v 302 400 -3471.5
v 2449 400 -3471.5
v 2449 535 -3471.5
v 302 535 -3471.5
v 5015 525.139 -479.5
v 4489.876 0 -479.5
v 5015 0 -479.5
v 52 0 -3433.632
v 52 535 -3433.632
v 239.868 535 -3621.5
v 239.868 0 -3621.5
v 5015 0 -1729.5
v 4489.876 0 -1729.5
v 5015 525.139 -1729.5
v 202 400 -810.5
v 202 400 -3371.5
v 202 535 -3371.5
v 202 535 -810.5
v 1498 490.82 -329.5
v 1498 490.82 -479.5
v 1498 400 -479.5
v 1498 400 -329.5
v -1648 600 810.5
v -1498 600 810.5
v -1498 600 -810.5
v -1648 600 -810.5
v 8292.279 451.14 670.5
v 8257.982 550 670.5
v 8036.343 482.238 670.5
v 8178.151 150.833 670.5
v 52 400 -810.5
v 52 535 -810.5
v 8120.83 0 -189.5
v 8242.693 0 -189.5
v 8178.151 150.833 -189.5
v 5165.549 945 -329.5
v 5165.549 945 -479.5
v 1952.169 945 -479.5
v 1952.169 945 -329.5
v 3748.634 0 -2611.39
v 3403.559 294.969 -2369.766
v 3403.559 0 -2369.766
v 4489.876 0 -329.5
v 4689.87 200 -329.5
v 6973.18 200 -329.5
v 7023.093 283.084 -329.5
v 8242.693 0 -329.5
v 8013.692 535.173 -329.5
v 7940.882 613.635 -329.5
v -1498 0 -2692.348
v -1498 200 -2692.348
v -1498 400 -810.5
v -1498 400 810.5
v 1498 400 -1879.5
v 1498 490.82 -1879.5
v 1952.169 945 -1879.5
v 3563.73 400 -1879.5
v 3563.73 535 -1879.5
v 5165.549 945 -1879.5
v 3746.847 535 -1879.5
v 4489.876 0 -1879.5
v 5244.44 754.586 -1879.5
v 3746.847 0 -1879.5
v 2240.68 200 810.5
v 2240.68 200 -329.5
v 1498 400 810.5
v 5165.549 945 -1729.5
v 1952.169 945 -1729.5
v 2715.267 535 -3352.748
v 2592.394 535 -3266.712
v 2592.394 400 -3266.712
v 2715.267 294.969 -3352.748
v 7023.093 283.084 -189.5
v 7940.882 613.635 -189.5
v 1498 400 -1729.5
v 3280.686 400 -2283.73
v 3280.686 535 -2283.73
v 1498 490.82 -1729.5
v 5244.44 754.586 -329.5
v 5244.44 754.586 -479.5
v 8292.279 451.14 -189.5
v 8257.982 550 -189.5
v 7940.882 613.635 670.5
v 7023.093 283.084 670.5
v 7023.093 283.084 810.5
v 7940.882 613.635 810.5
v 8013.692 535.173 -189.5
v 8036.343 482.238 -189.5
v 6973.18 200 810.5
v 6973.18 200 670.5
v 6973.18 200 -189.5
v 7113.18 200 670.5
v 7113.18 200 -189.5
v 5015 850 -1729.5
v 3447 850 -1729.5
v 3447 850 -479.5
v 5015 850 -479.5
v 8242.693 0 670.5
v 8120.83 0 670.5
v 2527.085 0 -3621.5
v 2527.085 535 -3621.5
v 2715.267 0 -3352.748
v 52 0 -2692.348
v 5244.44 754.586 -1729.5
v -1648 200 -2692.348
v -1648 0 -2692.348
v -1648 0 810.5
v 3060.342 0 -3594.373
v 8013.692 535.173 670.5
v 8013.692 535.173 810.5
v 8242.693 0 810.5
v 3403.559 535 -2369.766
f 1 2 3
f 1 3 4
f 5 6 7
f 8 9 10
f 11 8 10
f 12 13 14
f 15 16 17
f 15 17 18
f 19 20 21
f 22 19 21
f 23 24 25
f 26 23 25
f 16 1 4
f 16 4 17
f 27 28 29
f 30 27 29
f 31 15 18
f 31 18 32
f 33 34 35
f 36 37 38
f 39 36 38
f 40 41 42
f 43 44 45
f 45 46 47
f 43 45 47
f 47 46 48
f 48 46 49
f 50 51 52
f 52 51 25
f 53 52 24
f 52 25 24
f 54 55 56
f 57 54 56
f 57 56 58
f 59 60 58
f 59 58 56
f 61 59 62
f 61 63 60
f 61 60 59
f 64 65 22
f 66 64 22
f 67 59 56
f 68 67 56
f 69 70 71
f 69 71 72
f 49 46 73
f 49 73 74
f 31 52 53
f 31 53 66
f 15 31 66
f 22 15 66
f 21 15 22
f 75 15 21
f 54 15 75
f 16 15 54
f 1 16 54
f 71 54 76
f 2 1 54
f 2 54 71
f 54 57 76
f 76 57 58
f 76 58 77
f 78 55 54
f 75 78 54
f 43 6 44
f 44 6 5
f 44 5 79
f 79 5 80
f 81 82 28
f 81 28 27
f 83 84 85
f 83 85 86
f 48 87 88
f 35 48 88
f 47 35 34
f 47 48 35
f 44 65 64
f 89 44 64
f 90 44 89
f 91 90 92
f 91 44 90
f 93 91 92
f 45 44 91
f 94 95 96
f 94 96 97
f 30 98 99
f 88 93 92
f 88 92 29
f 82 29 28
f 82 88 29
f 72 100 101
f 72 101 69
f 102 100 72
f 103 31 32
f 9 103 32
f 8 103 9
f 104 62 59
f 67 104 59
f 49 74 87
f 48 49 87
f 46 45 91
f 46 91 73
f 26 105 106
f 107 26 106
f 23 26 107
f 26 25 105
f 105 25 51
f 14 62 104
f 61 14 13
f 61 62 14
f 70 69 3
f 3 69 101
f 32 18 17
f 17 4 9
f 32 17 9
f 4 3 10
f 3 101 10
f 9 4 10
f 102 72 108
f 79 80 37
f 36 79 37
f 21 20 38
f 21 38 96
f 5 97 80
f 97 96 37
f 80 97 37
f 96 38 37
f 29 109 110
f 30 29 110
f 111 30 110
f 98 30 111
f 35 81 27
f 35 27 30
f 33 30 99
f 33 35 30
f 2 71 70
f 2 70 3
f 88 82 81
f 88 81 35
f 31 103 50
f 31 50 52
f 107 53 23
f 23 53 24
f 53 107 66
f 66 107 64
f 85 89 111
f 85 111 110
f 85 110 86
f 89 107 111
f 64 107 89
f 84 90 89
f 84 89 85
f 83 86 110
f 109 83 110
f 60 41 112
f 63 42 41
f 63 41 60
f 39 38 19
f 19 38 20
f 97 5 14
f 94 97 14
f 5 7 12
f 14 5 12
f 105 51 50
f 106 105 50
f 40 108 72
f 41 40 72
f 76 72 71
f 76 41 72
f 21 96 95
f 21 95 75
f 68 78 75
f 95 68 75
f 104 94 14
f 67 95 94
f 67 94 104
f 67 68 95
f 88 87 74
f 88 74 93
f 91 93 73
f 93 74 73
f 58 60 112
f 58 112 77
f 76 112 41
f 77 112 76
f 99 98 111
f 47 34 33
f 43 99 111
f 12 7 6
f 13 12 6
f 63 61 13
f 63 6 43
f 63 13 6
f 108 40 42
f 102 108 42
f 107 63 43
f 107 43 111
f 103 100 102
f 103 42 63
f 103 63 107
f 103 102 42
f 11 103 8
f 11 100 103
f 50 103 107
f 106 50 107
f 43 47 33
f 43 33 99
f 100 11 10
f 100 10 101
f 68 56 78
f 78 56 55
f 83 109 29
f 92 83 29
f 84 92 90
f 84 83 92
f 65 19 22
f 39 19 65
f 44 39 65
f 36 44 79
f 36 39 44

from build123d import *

# Parameters (mm, degrees)
EXTRUDE_2_DEPTH      = 400
EXTRUDE_21_DEPTH     = 1700
SKETCH_8_W           = 3517
SKETCH_8_H           = 1550
EXTRUDE_3_DEPTH      = 850
CUT_EXTRUDE_1_DEPTH  = 5979.702952982
SKETCH_10_W          = 5615.18
SKETCH_10_H          = 1140
EXTRUDE_4_DEPTH      = 200
EXTRUDE_5_DEPTH      = 1140
EXTRUDE_6_DEPTH      = 140
EXTRUDE_10_DEPTH     = 150
EXTRUDE_11_DEPTH     = 535
CUT_EXTRUDE_START    = -1550
CUT_EXTRUDE_8_DEPTH  = 150
EXTRUDE_12_DEPTH     = 150
EXTRUDE_START        = -1400
EXTRUDE_13_DEPTH     = 150
CUT_EXTRUDE_9_DEPTH  = 150
CUT_EXTRUDE_10_DEPTH = 150
CUT_EXTRUDE_11_DEPTH = 9020.061936414
EXTRUDE_14_DEPTH     = 1200
EXTRUDE_18_DEPTH     = 860
EXTRUDE_START_2      = -1000
EXTRUDE_20_DEPTH     = 140


with BuildPart() as part:
    # 草图1 → 凸台-拉伸2 (new body)
    with BuildSketch(Plane(origin=(0, 0, 0), x_dir=(1, 0, 0), z_dir=(0, 1, 0))):
        Polygon((-1498, -810.5), (1498, -810.5), (1498, 1879.5), (3563.73040083, 1879.5), (2449, 3471.5), (202, 3471.5), (202, 810.5), (-1498, 810.5), align=None)
    extrude(amount=EXTRUDE_2_DEPTH)

    # 草图2 → 凸台-拉伸21 (add)
    with BuildSketch(Plane.ZY.offset(-202)):
        Polygon((-810.5, 0), (-2692.348222387, 0), (-810.5, 400), align=None)
    extrude(amount=EXTRUDE_21_DEPTH)

    # 草图8 → 凸台-拉伸3 (add)
    with BuildSketch(Plane(origin=(0, 0, 0), x_dir=(1, 0, 0), z_dir=(0, 1, 0))):
        with Locations((3256.5, 1104.5)):
            Rectangle(SKETCH_8_W, SKETCH_8_H)
    extrude(amount=EXTRUDE_3_DEPTH)

    # 草图9 → 切除-拉伸1 (cut, through all)
    with BuildSketch(Plane.XY.offset(-329.5)):
        Polygon((3447, 850), (1498, 400), (1498, 850), align=None)
    extrude(amount=-CUT_EXTRUDE_1_DEPTH, mode=Mode.SUBTRACT)

    # 草图10 → 凸台-拉伸4 (add)
    with BuildSketch(Plane(origin=(0, 0, 0), x_dir=(1, 0, 0), z_dir=(0, 1, 0))):
        with Locations((4305.59, -240.5)):
            Rectangle(SKETCH_10_W, SKETCH_10_H)
    extrude(amount=EXTRUDE_4_DEPTH)

    # 草图11 → 凸台-拉伸5 (add)
    with BuildSketch(Plane.XY.offset(-329.5)):
        Polygon((1498, 400), (1498, 200), (2240.68, 200), align=None)
    extrude(amount=EXTRUDE_5_DEPTH)

    # 草图13<4> → 凸台-拉伸6 (add)
    with BuildSketch(Plane(origin=(0, 0, -329.5), x_dir=(-1, 0, 0), z_dir=(0, 0, -1))):
        Polygon((-6853.029478436, 0), (-7023.093186264, 283.084427124), (-7940.882052173, 613.635251678), (-8013.69202852, 535.173356822), (-8242.693186264, 0), align=None)
    extrude(amount=-EXTRUDE_6_DEPTH)

    # 草图16 → 凸台-拉伸10 (add)
    with BuildSketch(Plane.ZY.offset(1498)):
        Polygon((-810.5, 600), (-2692.348222387, 200), (-2692.348222387, 0), (810.5, 0), (810.5, 600), align=None)
    extrude(amount=EXTRUDE_10_DEPTH)

    # 草图17 → 凸台-拉伸11 (add)
    with BuildSketch(Plane(origin=(0, 0, 0), x_dir=(1, 0, 0), z_dir=(0, 1, 0))):
        Polygon((202, 810.5), (52, 810.5), (52, 3433.632034356), (239.867965644, 3621.5), (2527.085057583, 3621.5), (3746.846589144, 1879.5), (3563.73040083, 1879.5), (2449, 3471.5), (302, 3471.5), (202, 3371.5), align=None)
    extrude(amount=EXTRUDE_11_DEPTH)

    # 草图18<2> → 切除-拉伸8 (cut)
    with BuildSketch(Plane(origin=(0, 0, -1879.5), x_dir=(-1, 0, 0), z_dir=(0, 0, -1)).offset(CUT_EXTRUDE_START)):
        Polygon((-4489.875994157, 0), (-5244.44, 754.585712816), (-5165.54937105, 945), (-1952.16937105, 945), (-1498, 490.82), (-1498, 0), align=None)
    extrude(amount=CUT_EXTRUDE_8_DEPTH, mode=Mode.SUBTRACT)

    # 草图18<3> → 凸台-拉伸12 (add)
    with BuildSketch(Plane(origin=(0, 0, -1879.5), x_dir=(-1, 0, 0), z_dir=(0, 0, -1))):
        Polygon((-4489.875994157, 0), (-5244.44, 754.585712816), (-5165.54937105, 945), (-1952.16937105, 945), (-1498, 490.82), (-1498, 0), align=None)
    extrude(amount=-EXTRUDE_12_DEPTH)

    # 草图18 → 凸台-拉伸13 (add)
    with BuildSketch(Plane(origin=(0, 0, -1879.5), x_dir=(-1, 0, 0), z_dir=(0, 0, -1)).offset(EXTRUDE_START)):
        Polygon((-4489.875994157, 0), (-5244.44, 754.585712816), (-5165.54937105, 945), (-1952.16937105, 945), (-1498, 490.82), (-1498, 0), align=None)
    extrude(amount=-EXTRUDE_13_DEPTH)

    # 草图19 → 切除-拉伸9 (cut)
    with BuildSketch(Plane(origin=(0, 0, -1879.5), x_dir=(-1, 0, 0), z_dir=(0, 0, -1))):
        Polygon((-5015, 525.139112385), (-4489.875994157, 0), (-5015, 0), align=None)
    extrude(amount=-CUT_EXTRUDE_9_DEPTH, mode=Mode.SUBTRACT)

    # 草图19<2> → 切除-拉伸10 (cut)
    with BuildSketch(Plane(origin=(0, 0, -1879.5), x_dir=(-1, 0, 0), z_dir=(0, 0, -1)).offset(CUT_EXTRUDE_START)):
        Polygon((-5015, 525.139112385), (-4489.875994157, 0), (-5015, 0), align=None)
    extrude(amount=CUT_EXTRUDE_10_DEPTH, mode=Mode.SUBTRACT)

    # 草图20 → 切除-拉伸11 (cut, through all)
    with BuildSketch(Plane(origin=(0, 535, 0), x_dir=(1, 0, 0), z_dir=(0, 1, 0))):
        Polygon((2592.394109088, 3266.711988928), (3165.80054009, 3668.215494373), (3854.092263711, 2685.233041227), (3280.685832709, 2283.729535781), align=None)
    extrude(amount=-CUT_EXTRUDE_11_DEPTH, mode=Mode.SUBTRACT)

    # 草图21 → 凸台-拉伸14 (add)
    with BuildSketch(Plane(origin=(6.310700678, 0, 9.012614594), x_dir=(-0.8191520442889888, 0, 0.5735764363510504), z_dir=(-0.5735764363510504, 0, -0.8191520442889888))):
        Polygon((-3997.273955256, 400), (-3997.273955256, 0), (-4568.533157953, 0), align=None)
    extrude(amount=EXTRUDE_14_DEPTH)

    # 草图15 → 凸台-拉伸18 (add)
    with BuildSketch(Plane.XY.offset(-189.5)):
        Polygon((7113.18, 0), (7113.18, 200), (8257.982320097, 550), (8292.2785298, 451.14), (8120.829514638, 0), align=None)
    extrude(amount=EXTRUDE_18_DEPTH)

    # 草图13 → 凸台-拉伸20 (add)
    with BuildSketch(Plane(origin=(0, 0, -329.5), x_dir=(-1, 0, 0), z_dir=(0, 0, -1)).offset(EXTRUDE_START_2)):
        Polygon((-6853.029478436, 0), (-7023.093186264, 283.084427124), (-7940.882052173, 613.635251678), (-8013.69202852, 535.173356822), (-8242.693186264, 0), align=None)
    extrude(amount=-EXTRUDE_20_DEPTH)


solid = part.part
